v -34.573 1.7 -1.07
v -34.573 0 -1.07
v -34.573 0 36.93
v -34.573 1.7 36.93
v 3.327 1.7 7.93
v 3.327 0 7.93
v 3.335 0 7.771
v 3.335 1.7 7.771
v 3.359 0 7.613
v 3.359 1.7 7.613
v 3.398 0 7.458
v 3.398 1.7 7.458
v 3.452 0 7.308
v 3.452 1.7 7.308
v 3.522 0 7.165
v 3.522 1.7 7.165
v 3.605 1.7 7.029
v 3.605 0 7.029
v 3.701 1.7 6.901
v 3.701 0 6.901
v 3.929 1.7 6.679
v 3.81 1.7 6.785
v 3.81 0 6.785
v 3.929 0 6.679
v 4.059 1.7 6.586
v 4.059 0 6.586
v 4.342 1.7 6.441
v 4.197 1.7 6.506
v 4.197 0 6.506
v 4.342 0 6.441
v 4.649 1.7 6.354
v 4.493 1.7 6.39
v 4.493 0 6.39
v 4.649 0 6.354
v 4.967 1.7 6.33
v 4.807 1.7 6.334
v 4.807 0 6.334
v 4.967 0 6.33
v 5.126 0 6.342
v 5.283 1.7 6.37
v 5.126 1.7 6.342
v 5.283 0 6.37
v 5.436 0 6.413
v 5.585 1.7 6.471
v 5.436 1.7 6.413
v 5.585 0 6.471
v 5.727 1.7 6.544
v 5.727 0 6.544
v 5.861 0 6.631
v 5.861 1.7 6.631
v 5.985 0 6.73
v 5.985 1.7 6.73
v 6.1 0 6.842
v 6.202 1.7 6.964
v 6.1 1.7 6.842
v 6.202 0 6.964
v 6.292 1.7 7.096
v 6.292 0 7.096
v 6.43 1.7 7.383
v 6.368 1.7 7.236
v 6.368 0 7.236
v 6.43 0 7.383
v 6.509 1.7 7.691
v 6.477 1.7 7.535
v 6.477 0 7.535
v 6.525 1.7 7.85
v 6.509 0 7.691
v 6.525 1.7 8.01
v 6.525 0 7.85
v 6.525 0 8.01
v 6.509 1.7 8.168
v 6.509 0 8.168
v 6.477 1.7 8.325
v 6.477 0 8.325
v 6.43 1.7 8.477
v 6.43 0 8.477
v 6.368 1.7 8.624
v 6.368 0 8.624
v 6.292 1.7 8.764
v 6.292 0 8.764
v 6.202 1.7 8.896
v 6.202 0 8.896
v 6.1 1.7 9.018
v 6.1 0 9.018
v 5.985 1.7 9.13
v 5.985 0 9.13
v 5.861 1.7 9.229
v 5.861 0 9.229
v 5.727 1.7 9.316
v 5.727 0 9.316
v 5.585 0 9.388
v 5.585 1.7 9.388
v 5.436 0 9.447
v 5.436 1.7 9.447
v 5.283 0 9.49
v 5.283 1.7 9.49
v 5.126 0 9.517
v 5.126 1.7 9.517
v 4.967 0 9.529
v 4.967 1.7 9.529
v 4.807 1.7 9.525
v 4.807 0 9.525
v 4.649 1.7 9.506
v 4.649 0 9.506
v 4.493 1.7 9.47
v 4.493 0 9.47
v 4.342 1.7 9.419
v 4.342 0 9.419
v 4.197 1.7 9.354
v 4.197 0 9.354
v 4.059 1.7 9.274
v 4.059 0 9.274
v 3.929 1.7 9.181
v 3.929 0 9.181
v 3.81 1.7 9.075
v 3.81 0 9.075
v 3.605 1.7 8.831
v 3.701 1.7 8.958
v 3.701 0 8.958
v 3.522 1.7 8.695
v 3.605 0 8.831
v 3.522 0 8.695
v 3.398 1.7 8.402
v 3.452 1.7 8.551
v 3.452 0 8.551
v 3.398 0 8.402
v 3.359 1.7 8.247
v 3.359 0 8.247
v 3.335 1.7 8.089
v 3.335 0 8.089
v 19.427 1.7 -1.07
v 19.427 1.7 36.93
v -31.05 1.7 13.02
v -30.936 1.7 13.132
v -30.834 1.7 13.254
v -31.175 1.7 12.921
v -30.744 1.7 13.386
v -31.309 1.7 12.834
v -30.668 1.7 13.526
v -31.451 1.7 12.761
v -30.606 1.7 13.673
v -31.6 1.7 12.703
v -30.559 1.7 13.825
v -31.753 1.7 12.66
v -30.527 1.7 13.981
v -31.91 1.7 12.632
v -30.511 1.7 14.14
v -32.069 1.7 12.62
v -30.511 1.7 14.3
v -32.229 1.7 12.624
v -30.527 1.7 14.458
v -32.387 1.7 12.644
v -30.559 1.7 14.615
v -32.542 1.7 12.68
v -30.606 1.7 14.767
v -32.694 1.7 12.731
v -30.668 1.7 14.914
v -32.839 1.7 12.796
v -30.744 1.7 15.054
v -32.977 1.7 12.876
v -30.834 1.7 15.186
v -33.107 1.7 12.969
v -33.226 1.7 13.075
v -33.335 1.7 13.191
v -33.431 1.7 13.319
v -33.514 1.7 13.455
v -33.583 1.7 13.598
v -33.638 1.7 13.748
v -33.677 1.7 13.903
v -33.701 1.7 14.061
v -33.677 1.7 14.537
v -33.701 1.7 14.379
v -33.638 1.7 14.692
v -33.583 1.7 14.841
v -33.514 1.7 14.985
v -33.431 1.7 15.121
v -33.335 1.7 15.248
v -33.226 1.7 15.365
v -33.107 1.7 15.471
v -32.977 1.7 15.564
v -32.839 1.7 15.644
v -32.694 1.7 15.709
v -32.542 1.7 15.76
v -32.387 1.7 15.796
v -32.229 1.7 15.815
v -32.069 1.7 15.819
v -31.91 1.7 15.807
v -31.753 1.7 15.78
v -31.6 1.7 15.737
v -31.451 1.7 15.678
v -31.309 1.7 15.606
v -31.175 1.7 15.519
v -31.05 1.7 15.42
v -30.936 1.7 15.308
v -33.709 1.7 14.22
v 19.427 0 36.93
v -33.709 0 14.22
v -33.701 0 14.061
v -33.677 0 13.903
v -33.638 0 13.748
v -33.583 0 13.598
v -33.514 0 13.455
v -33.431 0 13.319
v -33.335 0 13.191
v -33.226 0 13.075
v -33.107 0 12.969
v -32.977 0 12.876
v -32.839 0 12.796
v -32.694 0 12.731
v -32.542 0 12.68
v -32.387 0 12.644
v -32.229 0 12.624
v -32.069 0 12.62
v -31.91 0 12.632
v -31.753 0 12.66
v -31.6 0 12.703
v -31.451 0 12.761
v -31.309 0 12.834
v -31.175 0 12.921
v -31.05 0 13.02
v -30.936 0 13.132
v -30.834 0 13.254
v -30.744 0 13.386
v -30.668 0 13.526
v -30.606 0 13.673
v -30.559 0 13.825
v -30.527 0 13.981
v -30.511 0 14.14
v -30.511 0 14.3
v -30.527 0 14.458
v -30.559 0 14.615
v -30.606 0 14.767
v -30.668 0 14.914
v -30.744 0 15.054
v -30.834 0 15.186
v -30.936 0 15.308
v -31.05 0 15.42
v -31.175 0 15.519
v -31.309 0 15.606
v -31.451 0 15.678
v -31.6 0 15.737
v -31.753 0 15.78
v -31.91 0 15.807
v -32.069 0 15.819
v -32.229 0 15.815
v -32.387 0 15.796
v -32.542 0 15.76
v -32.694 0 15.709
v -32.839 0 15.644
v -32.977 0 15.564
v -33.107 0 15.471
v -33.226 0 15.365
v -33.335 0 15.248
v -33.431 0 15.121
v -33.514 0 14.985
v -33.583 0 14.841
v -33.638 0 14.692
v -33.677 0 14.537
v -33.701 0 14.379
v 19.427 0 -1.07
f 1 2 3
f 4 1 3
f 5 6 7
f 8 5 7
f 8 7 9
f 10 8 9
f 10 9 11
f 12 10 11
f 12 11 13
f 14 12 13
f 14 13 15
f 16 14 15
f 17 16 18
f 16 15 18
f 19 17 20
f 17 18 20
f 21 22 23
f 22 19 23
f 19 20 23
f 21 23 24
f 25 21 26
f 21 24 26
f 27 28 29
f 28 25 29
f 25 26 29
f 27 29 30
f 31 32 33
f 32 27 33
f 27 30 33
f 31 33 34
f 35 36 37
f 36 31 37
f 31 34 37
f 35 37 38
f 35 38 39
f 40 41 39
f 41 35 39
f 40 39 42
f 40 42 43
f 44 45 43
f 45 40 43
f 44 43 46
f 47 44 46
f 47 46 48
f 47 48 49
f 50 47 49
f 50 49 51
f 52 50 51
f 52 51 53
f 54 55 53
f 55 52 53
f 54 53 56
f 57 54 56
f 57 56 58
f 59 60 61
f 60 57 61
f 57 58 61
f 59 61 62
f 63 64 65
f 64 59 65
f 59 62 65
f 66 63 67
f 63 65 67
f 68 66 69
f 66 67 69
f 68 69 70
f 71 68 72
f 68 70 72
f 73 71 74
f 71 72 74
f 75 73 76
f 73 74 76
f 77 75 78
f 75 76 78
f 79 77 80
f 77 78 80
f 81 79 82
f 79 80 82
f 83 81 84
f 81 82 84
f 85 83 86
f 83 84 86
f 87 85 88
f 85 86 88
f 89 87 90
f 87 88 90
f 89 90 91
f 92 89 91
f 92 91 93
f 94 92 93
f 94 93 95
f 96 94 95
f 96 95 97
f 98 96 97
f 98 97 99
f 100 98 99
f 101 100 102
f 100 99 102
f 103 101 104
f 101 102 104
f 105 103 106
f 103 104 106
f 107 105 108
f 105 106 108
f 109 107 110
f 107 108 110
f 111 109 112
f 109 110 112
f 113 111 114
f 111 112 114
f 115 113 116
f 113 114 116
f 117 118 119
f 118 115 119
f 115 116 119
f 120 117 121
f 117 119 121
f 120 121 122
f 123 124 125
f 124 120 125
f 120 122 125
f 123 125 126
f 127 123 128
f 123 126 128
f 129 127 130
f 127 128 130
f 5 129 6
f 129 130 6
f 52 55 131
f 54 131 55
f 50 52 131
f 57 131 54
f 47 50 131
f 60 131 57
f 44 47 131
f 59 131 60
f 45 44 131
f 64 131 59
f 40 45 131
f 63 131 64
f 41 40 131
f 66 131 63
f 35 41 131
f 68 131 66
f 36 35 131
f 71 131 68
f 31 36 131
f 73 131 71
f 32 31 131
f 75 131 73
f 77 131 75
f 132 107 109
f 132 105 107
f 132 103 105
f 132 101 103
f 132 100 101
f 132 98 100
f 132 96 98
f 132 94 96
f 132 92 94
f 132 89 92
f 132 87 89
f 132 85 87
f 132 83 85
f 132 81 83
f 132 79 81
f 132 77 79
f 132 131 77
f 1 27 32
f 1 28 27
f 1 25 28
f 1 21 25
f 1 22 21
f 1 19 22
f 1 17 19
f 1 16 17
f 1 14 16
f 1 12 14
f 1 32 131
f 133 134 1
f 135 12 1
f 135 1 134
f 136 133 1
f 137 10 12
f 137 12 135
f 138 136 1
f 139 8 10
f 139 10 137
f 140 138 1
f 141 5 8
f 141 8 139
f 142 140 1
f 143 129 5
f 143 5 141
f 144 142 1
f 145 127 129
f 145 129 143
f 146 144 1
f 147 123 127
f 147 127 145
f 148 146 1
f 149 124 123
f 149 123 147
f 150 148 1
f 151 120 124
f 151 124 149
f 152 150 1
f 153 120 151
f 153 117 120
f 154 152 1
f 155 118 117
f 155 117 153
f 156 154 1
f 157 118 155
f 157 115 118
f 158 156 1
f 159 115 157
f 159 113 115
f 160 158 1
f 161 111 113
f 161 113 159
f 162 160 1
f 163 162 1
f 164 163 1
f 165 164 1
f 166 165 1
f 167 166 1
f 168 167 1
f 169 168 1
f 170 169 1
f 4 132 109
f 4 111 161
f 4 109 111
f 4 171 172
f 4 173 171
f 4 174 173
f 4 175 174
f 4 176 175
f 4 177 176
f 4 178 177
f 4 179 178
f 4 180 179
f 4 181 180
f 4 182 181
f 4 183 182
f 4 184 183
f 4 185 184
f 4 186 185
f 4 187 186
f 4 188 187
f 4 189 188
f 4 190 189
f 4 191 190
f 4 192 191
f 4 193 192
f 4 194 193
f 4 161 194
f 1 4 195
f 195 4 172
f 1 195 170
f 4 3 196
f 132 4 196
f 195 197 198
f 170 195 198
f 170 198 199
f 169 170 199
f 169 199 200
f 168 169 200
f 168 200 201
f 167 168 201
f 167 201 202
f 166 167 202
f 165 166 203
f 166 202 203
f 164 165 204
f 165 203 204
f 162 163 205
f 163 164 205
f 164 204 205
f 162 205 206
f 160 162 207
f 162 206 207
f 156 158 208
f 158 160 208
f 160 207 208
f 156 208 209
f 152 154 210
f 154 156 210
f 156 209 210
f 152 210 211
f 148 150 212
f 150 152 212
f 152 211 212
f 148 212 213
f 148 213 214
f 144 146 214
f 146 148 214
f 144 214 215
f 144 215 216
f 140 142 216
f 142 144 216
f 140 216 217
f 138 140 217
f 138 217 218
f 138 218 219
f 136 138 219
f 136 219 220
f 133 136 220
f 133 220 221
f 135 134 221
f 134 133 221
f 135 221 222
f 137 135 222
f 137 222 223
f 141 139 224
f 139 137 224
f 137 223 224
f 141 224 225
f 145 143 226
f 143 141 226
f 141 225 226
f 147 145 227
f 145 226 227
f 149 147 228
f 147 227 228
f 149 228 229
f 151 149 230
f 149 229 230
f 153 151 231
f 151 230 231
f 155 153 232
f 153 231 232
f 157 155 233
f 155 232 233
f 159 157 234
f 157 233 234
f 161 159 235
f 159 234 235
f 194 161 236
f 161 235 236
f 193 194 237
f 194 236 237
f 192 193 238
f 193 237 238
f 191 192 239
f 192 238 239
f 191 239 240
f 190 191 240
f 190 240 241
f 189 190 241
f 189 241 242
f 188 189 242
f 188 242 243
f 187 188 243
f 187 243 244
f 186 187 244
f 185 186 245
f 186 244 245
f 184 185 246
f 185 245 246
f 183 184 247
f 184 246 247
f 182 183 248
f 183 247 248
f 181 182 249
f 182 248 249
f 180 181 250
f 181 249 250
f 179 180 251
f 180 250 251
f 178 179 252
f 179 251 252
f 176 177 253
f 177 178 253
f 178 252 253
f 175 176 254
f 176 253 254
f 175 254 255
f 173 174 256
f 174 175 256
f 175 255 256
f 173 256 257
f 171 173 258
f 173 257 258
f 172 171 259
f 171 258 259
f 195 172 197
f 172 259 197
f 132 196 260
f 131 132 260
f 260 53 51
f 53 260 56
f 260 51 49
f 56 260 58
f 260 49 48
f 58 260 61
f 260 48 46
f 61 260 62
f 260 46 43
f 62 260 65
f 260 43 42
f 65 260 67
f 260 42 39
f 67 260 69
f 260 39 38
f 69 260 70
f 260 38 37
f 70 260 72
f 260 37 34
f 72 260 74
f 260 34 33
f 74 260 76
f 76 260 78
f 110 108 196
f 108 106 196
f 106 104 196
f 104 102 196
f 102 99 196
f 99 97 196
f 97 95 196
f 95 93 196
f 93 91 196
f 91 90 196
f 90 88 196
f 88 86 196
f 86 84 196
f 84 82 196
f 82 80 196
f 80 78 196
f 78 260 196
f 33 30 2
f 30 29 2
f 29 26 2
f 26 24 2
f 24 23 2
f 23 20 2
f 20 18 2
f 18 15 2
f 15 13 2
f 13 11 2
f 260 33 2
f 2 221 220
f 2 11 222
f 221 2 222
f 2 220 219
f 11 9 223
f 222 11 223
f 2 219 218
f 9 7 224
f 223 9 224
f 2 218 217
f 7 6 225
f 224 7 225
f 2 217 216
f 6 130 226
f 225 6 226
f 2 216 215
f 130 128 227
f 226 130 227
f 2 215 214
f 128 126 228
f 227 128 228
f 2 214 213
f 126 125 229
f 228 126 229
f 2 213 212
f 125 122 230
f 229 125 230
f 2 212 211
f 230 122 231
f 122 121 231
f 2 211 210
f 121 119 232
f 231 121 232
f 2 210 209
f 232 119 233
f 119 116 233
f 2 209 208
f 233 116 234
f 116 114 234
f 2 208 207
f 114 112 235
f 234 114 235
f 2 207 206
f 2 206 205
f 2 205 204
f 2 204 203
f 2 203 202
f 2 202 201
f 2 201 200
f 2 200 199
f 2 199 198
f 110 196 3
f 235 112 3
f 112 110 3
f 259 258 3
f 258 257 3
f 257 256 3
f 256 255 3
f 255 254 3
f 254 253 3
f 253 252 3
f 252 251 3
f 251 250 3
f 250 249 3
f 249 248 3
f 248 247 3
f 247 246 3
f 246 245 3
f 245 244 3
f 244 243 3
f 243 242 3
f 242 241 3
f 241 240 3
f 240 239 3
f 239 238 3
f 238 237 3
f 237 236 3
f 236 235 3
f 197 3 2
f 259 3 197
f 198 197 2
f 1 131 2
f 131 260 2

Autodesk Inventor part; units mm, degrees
ref_plane "YZ Plane" through (0, 0, 0) normal (1, 0, 0) x (0, 1, 0)
ref_plane "XZ Plane" through (0, 0, 0) normal (0, 1, 0) x (-1, 0, 0)
ref_plane "XY Plane" through (0, 0, 0) normal (0, 0, 1) x (1, 0, 0)
sketch "Эскиз1" plane through (0, 0, 0) normal (0, 1, 0) x (-1, 0, 0)
  circle A0 centre (-4.9268, 7.9299) radius 1.6
  line L0 (-19.4268, -1.0701) -> (34.5732, -1.0701)
  line L1 (34.5732, -1.0701) -> (34.5732, 36.9299)
  line L2 (34.5732, 36.9299) -> (-19.4268, 36.9299)
  line L3 (-19.4268, 36.9299) -> (-19.4268, -1.0701)
  circle A1 centre (32.1091, 14.2199) radius 1.6
  point P0 (0, 0)
extrude "Выдавливание1" add sketch "Эскиз1" along normal blind 1.7
properties part number "mega_switchboard"
